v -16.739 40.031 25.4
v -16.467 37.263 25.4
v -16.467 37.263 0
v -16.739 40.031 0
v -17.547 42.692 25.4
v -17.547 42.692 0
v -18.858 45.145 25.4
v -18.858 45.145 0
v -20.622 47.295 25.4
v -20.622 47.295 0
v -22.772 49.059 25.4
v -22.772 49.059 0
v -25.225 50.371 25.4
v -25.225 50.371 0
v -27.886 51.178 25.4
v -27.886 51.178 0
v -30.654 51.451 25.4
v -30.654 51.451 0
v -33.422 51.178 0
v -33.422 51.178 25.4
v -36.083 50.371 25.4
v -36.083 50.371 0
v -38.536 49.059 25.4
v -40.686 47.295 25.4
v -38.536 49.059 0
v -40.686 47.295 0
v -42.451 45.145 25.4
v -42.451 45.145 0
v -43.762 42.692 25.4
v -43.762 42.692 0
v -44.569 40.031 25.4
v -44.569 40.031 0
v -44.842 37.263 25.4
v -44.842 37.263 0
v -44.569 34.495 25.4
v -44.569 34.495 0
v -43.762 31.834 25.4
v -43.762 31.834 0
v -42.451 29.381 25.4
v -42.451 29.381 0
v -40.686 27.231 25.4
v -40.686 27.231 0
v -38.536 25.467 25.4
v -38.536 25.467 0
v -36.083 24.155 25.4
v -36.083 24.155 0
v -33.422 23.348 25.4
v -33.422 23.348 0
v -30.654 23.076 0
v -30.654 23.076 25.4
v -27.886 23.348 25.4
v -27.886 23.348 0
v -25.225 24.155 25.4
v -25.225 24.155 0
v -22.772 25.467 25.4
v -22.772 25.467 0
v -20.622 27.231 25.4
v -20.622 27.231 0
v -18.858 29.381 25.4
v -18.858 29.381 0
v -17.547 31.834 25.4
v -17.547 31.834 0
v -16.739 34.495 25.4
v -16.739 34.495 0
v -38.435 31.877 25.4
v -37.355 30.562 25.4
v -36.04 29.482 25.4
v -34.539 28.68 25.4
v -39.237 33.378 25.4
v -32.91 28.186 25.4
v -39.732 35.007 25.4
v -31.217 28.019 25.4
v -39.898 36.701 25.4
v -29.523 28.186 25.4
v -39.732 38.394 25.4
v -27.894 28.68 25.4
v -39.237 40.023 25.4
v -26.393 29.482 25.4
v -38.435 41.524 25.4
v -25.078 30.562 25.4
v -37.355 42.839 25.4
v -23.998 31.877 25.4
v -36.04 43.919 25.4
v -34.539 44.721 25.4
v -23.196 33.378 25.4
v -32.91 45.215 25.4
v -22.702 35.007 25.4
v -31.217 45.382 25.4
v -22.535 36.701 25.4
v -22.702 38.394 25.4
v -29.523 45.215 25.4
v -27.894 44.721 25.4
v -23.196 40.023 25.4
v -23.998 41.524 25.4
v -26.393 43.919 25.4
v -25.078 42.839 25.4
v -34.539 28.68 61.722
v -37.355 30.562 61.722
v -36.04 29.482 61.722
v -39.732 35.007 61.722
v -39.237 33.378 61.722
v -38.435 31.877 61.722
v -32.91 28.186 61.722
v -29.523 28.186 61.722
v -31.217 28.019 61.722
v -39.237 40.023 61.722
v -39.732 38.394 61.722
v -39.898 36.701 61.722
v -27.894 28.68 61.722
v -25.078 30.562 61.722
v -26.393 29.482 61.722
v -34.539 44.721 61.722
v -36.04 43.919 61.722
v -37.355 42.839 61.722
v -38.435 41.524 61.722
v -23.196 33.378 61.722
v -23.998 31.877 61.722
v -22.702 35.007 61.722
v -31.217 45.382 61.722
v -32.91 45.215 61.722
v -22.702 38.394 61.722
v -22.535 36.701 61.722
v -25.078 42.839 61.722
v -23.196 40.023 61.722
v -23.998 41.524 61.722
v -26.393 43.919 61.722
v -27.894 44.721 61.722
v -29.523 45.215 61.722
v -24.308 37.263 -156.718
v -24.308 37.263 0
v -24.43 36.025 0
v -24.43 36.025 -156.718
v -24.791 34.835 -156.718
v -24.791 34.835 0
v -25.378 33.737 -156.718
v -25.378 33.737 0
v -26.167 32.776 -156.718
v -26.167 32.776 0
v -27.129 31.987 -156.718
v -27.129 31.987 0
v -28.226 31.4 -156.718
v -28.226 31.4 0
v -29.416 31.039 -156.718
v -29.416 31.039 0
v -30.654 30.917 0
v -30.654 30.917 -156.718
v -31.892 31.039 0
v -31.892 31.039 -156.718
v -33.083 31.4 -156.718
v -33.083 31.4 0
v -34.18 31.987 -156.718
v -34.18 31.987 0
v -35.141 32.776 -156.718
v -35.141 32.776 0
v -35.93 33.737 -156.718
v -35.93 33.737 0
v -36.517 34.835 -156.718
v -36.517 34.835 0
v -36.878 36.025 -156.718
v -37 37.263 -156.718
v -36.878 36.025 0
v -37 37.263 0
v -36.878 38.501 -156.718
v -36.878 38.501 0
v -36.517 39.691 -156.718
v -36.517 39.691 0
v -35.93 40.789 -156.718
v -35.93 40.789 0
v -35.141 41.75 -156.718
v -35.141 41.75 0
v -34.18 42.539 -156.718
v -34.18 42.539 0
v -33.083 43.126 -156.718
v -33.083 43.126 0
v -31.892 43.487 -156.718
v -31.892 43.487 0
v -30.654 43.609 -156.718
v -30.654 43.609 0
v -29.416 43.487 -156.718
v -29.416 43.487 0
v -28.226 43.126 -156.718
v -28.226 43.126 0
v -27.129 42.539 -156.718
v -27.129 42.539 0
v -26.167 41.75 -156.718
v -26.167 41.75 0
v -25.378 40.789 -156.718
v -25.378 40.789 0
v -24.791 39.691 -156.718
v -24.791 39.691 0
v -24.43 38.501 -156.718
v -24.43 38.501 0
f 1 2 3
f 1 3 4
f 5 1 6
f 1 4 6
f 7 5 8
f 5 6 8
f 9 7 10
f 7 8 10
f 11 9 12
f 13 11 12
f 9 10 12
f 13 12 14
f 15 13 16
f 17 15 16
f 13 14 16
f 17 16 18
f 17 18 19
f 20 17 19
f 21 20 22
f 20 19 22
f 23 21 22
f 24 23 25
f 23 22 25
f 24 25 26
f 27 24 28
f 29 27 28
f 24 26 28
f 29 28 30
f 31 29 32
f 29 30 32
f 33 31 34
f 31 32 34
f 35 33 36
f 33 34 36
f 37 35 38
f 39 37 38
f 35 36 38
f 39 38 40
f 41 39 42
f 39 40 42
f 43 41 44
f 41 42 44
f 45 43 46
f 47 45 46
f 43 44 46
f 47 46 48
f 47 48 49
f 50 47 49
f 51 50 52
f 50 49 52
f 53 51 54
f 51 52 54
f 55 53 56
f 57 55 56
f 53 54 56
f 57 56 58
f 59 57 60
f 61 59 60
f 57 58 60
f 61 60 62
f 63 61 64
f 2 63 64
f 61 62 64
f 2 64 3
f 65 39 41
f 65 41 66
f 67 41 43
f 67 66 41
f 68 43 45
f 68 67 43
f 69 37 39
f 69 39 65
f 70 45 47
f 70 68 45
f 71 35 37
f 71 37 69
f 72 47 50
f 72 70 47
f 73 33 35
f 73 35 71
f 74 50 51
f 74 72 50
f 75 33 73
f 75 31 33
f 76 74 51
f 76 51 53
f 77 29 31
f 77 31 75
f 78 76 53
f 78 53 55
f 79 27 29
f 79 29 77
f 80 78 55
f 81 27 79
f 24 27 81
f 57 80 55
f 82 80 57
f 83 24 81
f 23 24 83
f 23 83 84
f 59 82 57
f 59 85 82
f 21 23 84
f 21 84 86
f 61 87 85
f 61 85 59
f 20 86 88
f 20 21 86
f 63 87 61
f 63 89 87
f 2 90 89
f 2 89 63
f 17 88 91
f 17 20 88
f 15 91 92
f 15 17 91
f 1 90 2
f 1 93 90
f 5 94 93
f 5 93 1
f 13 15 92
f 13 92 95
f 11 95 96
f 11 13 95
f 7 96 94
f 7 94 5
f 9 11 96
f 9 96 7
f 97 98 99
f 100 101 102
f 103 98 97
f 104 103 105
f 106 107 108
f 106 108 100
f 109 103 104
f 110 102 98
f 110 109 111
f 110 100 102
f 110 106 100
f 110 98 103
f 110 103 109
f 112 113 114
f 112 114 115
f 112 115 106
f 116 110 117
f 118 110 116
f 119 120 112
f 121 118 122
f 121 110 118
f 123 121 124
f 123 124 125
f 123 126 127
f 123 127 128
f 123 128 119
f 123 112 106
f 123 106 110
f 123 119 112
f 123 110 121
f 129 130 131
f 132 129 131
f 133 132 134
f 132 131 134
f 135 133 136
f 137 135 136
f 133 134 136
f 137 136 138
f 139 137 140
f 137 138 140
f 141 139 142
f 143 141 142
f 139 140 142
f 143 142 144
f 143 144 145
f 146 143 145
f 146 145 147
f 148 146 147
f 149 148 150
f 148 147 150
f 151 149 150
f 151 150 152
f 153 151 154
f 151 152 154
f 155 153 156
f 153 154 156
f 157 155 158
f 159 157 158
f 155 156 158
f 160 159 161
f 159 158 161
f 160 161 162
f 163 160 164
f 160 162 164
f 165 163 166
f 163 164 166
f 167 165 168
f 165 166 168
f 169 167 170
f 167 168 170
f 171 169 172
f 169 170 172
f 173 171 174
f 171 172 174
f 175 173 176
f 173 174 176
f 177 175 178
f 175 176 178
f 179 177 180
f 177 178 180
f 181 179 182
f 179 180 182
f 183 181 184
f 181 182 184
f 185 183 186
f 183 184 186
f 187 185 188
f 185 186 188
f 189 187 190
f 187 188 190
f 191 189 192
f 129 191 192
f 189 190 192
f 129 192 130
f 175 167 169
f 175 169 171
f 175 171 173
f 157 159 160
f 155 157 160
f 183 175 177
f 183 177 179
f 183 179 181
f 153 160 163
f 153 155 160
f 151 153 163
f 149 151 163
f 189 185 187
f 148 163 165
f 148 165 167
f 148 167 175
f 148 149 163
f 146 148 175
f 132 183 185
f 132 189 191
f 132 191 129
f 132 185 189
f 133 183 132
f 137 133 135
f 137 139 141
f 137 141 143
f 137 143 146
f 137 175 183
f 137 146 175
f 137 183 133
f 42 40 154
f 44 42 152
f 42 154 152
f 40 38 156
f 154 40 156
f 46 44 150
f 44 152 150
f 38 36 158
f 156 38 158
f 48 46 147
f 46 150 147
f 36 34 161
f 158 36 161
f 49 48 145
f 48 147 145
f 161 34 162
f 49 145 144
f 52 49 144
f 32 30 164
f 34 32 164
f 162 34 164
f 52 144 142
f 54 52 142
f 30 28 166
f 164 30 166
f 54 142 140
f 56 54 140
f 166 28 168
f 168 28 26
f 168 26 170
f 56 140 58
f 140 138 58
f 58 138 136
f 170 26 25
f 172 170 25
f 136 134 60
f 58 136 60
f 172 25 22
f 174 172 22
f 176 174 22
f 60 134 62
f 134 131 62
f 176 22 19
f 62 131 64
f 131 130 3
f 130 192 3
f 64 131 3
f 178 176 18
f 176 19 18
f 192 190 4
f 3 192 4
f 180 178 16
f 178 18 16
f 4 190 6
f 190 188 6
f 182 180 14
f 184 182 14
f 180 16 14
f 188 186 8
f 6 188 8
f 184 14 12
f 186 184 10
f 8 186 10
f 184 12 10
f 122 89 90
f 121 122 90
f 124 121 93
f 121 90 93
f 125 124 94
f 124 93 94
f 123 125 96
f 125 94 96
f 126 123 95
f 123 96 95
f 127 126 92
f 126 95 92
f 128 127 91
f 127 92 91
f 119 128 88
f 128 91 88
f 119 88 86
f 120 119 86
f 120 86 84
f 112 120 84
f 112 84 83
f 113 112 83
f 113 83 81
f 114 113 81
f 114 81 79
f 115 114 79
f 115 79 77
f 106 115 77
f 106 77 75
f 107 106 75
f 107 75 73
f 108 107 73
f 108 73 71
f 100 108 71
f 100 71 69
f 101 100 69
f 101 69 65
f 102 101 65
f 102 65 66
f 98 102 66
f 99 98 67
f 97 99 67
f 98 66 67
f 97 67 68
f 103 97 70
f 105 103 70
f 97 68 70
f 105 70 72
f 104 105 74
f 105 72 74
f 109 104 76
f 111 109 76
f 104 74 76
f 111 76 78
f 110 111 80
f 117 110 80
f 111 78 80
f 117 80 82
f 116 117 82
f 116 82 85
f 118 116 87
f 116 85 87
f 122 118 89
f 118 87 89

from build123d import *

# Parameters (mm, degrees)
F0_R     = 8.68177
F1_DEPTH = 61.722
F2_R     = 14.1875
F3_DEPTH = 25.4
F4_R     = 6.345818
F5_DEPTH = 156.718


with BuildPart() as f1:
    # F0 (on Top) → F1 (new body)
    with BuildSketch(Plane.XY):
        with Locations((-31.216556, 36.700543)):
            Circle(F0_R)
    extrude(amount=F1_DEPTH)

    # F2 (on Top) → F3 (join)
    with BuildSketch(Plane.XY):
        with Locations((-30.654097, 37.263006)):
            Circle(F2_R)
    extrude(amount=F3_DEPTH)

    # F4 (on face) → F5 (join)
    with BuildSketch(Plane(origin=(0, 0, 0), x_dir=(1, 0, 0), z_dir=(0, 0, -1))):
        with Locations((-30.654097, -37.263006)):
            Circle(F4_R)
    extrude(amount=F5_DEPTH)


solid = f1.part
